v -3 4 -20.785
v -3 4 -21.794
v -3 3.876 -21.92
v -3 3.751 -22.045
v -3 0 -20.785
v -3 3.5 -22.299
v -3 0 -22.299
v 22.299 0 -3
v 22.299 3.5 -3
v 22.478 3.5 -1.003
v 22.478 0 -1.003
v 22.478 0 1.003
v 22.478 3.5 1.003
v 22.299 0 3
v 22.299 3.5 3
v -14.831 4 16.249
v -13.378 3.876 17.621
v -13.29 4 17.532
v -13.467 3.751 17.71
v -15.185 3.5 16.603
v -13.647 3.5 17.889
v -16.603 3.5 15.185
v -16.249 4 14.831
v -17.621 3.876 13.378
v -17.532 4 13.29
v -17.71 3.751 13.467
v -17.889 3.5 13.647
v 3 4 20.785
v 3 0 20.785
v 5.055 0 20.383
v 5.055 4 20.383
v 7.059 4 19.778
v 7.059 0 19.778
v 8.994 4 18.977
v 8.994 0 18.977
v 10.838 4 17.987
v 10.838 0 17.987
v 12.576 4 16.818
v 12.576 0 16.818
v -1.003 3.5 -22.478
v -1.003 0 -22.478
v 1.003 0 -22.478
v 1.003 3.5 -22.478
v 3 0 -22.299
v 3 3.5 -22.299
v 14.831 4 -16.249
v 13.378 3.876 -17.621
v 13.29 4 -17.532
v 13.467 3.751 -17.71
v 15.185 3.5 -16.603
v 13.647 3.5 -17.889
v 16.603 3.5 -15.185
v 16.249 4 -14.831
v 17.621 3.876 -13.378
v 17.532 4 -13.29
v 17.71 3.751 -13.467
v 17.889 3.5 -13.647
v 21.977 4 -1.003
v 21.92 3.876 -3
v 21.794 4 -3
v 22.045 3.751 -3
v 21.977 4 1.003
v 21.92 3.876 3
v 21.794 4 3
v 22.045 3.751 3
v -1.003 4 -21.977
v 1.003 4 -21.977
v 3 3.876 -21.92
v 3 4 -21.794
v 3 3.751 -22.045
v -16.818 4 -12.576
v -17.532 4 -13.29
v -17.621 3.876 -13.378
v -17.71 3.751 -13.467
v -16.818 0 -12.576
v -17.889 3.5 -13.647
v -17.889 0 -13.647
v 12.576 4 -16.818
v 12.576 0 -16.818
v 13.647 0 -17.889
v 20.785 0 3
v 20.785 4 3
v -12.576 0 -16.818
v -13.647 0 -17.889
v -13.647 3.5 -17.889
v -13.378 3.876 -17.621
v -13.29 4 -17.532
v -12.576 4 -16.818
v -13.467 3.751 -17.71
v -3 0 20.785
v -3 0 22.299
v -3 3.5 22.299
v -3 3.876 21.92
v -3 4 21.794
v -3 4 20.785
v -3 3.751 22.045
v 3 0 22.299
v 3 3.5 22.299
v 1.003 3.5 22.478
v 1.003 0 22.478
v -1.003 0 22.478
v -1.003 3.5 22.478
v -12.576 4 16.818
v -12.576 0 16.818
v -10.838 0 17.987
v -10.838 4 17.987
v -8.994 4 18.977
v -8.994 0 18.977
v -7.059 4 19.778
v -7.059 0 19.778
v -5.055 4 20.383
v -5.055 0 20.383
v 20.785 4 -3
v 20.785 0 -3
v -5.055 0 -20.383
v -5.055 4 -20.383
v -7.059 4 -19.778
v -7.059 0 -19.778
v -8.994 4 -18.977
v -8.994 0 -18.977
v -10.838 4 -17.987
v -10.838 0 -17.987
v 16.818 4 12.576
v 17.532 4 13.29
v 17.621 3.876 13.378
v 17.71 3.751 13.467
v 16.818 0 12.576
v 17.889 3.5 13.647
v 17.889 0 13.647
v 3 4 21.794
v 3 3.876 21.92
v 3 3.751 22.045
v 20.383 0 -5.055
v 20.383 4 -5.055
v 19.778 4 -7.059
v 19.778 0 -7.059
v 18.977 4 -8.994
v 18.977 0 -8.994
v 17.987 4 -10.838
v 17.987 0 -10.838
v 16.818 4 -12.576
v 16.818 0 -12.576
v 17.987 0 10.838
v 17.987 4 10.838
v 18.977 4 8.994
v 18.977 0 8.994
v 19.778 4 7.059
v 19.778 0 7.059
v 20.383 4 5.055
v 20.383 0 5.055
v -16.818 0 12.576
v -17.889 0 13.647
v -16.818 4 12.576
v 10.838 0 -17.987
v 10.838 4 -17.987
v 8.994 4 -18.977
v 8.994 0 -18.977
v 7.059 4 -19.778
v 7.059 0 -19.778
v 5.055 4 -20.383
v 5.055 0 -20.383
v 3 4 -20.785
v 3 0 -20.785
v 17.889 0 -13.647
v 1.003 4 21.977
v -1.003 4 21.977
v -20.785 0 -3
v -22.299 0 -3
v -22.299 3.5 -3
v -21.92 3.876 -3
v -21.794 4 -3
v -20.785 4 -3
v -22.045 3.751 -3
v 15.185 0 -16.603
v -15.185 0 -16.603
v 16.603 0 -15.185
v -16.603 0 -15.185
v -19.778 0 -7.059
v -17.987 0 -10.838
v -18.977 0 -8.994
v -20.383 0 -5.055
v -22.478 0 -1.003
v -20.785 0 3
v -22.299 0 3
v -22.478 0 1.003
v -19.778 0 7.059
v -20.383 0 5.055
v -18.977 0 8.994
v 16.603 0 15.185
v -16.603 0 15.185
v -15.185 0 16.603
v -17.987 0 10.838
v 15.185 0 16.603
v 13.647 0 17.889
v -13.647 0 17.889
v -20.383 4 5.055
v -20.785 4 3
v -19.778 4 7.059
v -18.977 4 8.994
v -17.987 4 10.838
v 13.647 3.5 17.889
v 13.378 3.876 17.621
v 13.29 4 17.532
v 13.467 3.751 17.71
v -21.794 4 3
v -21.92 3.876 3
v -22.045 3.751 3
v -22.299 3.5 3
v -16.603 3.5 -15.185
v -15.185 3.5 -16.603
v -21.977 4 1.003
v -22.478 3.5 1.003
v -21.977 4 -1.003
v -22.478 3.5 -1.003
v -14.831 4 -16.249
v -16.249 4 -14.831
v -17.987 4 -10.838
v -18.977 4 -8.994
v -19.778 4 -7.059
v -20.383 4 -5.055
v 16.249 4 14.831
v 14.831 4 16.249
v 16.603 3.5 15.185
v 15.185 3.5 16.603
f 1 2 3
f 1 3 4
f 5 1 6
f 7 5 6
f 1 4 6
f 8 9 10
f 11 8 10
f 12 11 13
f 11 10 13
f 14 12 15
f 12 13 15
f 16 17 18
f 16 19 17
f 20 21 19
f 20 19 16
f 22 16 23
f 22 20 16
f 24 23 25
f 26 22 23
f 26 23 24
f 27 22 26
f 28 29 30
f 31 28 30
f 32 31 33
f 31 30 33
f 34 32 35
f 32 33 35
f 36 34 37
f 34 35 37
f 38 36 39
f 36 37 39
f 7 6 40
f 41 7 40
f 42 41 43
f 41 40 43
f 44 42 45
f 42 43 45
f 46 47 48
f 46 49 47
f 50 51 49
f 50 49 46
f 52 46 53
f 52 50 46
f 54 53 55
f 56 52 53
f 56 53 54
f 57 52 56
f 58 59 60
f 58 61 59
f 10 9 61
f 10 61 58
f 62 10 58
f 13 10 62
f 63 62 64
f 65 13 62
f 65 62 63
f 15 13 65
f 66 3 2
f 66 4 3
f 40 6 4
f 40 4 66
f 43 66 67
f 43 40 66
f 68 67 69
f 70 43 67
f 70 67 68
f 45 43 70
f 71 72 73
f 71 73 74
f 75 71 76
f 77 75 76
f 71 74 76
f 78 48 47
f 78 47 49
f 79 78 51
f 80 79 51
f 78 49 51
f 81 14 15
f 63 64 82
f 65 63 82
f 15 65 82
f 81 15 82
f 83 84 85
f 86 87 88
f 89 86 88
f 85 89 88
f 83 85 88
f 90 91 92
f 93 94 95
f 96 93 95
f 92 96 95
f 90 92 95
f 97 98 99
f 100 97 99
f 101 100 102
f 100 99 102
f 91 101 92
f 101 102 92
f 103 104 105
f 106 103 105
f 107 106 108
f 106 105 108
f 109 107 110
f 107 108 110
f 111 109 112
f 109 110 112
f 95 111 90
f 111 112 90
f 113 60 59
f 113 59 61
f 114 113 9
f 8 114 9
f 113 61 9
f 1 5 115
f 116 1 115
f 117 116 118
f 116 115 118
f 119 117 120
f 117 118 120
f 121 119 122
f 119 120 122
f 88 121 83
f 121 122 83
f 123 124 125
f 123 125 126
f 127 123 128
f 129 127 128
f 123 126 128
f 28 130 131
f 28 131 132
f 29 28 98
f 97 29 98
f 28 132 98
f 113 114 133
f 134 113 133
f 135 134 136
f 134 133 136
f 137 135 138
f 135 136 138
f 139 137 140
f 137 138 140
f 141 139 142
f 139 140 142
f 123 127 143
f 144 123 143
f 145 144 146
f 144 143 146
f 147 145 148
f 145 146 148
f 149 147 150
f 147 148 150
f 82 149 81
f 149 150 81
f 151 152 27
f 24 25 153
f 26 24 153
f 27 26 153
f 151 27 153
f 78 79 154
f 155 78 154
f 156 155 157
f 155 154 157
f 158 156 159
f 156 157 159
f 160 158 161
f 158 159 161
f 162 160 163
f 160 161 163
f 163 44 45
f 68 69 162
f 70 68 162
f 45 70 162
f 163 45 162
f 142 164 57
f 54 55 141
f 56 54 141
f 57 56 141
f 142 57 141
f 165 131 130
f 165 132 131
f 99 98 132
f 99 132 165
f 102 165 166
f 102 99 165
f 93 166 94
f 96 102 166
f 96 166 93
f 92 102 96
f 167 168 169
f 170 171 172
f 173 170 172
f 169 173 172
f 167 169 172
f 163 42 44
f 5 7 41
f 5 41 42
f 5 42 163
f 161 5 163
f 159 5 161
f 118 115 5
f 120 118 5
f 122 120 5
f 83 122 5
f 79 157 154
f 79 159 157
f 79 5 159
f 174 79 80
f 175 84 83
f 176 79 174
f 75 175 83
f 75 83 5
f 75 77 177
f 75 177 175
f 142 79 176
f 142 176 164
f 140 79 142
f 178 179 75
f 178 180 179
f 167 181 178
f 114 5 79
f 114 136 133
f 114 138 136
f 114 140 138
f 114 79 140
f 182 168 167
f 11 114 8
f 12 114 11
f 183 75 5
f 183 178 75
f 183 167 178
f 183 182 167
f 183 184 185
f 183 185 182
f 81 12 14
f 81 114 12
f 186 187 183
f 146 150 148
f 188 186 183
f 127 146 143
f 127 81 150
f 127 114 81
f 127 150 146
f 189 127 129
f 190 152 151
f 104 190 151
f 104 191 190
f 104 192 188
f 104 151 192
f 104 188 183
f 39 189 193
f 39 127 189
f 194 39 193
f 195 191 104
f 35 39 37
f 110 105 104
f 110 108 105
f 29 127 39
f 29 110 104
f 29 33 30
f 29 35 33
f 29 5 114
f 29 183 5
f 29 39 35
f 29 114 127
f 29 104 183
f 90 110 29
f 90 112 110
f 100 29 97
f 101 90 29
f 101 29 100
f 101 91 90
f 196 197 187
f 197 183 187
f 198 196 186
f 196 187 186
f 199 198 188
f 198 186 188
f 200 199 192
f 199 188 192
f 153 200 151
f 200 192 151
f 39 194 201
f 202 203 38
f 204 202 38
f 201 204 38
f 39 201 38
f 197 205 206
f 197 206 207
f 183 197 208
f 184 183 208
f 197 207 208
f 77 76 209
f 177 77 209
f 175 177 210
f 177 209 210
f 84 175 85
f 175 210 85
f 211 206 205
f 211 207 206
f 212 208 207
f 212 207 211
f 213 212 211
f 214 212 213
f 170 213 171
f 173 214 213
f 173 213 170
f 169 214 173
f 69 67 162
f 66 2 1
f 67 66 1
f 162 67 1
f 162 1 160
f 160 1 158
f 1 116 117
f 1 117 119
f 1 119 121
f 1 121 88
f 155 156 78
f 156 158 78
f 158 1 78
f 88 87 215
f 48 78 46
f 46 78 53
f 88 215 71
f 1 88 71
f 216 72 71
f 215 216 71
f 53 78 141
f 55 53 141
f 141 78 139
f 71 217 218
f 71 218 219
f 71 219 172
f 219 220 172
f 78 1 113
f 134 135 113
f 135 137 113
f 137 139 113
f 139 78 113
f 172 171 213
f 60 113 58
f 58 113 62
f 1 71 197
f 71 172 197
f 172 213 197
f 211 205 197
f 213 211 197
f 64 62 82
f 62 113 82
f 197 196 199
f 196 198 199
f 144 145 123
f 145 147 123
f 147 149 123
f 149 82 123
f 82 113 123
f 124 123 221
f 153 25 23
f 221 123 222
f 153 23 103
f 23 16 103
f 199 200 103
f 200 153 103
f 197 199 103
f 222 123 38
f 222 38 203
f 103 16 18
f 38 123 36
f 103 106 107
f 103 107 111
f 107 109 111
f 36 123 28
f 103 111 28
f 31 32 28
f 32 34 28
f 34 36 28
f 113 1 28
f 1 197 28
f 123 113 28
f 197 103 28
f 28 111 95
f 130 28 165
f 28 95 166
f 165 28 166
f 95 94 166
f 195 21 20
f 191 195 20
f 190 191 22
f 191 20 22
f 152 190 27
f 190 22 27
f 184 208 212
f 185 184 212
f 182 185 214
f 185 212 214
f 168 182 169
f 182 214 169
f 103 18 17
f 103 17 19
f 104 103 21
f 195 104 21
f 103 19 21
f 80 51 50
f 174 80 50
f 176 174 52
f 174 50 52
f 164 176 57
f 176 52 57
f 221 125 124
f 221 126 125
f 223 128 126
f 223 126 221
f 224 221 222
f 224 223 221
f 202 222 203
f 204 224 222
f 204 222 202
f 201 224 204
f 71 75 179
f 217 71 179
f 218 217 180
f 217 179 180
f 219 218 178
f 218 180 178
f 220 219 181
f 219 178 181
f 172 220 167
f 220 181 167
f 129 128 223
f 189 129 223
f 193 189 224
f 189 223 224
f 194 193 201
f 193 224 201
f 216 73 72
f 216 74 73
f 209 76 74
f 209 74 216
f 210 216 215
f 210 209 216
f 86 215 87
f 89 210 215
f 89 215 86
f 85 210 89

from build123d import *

# Parameters (mm, degrees)
SKETCH_1_R               = 21
EXTRUDE_1_DEPTH          = 4
EXTRUDE_2_DEPTH          = 4
PATTERN_CIRCULAR_1_COUNT = 8
CHAMFER_1_SIZE           = 0.5


with BuildPart() as part:
    # 草图1 → 凸台-拉伸1 (new body)
    with BuildSketch(Plane(origin=(0, 0, 0), x_dir=(1, 0, 0), z_dir=(0, 1, 0))):
        Circle(SKETCH_1_R)
    extrude(amount=EXTRUDE_1_DEPTH)

    # 草图2 → 凸台-拉伸2 (add)
    with BuildSketch(Plane(origin=(0, 4, 0), x_dir=(1, 0, 0), z_dir=(0, 1, 0))):
        with BuildLine():
            Line((-22.299103121, 3), (22.299103121, 3))
            ThreePointArc((22.299103121, 3), (22.5, 0), (22.299103121, -3))
            Line((22.299103121, -3), (-22.299103121, -3))
            ThreePointArc((-22.299103121, -3), (-22.5, 0), (-22.299103121, 3))
        make_face()
    extrude_2 = extrude(amount=-EXTRUDE_2_DEPTH)

    # 阵列(圆周)1: 凸台-拉伸2 ×8 about axis
    pattern_circular_1_axis = Axis((0, 0, 0), (0, 1, 0))
    for i in range(1, PATTERN_CIRCULAR_1_COUNT):
        add(extrude_2.rotate(pattern_circular_1_axis, i * 360 / PATTERN_CIRCULAR_1_COUNT))

    # 倒角1
    chamfer_1_edges = [part.edges().sort_by_distance(p)[0] for p in [
        (22.5, 4, 0),
        (-22.5, 4, 0),
        (15.909902577, 4, -15.909902577),
        (0, 4, -22.5),
        (-15.909902577, 4, -15.909902577),
        (15.909902577, 4, 15.909902577),
        (-15.909902577, 4, 15.909902577),
        (0, 4, 22.5),
    ]]
    chamfer(chamfer_1_edges, length=CHAMFER_1_SIZE)


solid = part.part
